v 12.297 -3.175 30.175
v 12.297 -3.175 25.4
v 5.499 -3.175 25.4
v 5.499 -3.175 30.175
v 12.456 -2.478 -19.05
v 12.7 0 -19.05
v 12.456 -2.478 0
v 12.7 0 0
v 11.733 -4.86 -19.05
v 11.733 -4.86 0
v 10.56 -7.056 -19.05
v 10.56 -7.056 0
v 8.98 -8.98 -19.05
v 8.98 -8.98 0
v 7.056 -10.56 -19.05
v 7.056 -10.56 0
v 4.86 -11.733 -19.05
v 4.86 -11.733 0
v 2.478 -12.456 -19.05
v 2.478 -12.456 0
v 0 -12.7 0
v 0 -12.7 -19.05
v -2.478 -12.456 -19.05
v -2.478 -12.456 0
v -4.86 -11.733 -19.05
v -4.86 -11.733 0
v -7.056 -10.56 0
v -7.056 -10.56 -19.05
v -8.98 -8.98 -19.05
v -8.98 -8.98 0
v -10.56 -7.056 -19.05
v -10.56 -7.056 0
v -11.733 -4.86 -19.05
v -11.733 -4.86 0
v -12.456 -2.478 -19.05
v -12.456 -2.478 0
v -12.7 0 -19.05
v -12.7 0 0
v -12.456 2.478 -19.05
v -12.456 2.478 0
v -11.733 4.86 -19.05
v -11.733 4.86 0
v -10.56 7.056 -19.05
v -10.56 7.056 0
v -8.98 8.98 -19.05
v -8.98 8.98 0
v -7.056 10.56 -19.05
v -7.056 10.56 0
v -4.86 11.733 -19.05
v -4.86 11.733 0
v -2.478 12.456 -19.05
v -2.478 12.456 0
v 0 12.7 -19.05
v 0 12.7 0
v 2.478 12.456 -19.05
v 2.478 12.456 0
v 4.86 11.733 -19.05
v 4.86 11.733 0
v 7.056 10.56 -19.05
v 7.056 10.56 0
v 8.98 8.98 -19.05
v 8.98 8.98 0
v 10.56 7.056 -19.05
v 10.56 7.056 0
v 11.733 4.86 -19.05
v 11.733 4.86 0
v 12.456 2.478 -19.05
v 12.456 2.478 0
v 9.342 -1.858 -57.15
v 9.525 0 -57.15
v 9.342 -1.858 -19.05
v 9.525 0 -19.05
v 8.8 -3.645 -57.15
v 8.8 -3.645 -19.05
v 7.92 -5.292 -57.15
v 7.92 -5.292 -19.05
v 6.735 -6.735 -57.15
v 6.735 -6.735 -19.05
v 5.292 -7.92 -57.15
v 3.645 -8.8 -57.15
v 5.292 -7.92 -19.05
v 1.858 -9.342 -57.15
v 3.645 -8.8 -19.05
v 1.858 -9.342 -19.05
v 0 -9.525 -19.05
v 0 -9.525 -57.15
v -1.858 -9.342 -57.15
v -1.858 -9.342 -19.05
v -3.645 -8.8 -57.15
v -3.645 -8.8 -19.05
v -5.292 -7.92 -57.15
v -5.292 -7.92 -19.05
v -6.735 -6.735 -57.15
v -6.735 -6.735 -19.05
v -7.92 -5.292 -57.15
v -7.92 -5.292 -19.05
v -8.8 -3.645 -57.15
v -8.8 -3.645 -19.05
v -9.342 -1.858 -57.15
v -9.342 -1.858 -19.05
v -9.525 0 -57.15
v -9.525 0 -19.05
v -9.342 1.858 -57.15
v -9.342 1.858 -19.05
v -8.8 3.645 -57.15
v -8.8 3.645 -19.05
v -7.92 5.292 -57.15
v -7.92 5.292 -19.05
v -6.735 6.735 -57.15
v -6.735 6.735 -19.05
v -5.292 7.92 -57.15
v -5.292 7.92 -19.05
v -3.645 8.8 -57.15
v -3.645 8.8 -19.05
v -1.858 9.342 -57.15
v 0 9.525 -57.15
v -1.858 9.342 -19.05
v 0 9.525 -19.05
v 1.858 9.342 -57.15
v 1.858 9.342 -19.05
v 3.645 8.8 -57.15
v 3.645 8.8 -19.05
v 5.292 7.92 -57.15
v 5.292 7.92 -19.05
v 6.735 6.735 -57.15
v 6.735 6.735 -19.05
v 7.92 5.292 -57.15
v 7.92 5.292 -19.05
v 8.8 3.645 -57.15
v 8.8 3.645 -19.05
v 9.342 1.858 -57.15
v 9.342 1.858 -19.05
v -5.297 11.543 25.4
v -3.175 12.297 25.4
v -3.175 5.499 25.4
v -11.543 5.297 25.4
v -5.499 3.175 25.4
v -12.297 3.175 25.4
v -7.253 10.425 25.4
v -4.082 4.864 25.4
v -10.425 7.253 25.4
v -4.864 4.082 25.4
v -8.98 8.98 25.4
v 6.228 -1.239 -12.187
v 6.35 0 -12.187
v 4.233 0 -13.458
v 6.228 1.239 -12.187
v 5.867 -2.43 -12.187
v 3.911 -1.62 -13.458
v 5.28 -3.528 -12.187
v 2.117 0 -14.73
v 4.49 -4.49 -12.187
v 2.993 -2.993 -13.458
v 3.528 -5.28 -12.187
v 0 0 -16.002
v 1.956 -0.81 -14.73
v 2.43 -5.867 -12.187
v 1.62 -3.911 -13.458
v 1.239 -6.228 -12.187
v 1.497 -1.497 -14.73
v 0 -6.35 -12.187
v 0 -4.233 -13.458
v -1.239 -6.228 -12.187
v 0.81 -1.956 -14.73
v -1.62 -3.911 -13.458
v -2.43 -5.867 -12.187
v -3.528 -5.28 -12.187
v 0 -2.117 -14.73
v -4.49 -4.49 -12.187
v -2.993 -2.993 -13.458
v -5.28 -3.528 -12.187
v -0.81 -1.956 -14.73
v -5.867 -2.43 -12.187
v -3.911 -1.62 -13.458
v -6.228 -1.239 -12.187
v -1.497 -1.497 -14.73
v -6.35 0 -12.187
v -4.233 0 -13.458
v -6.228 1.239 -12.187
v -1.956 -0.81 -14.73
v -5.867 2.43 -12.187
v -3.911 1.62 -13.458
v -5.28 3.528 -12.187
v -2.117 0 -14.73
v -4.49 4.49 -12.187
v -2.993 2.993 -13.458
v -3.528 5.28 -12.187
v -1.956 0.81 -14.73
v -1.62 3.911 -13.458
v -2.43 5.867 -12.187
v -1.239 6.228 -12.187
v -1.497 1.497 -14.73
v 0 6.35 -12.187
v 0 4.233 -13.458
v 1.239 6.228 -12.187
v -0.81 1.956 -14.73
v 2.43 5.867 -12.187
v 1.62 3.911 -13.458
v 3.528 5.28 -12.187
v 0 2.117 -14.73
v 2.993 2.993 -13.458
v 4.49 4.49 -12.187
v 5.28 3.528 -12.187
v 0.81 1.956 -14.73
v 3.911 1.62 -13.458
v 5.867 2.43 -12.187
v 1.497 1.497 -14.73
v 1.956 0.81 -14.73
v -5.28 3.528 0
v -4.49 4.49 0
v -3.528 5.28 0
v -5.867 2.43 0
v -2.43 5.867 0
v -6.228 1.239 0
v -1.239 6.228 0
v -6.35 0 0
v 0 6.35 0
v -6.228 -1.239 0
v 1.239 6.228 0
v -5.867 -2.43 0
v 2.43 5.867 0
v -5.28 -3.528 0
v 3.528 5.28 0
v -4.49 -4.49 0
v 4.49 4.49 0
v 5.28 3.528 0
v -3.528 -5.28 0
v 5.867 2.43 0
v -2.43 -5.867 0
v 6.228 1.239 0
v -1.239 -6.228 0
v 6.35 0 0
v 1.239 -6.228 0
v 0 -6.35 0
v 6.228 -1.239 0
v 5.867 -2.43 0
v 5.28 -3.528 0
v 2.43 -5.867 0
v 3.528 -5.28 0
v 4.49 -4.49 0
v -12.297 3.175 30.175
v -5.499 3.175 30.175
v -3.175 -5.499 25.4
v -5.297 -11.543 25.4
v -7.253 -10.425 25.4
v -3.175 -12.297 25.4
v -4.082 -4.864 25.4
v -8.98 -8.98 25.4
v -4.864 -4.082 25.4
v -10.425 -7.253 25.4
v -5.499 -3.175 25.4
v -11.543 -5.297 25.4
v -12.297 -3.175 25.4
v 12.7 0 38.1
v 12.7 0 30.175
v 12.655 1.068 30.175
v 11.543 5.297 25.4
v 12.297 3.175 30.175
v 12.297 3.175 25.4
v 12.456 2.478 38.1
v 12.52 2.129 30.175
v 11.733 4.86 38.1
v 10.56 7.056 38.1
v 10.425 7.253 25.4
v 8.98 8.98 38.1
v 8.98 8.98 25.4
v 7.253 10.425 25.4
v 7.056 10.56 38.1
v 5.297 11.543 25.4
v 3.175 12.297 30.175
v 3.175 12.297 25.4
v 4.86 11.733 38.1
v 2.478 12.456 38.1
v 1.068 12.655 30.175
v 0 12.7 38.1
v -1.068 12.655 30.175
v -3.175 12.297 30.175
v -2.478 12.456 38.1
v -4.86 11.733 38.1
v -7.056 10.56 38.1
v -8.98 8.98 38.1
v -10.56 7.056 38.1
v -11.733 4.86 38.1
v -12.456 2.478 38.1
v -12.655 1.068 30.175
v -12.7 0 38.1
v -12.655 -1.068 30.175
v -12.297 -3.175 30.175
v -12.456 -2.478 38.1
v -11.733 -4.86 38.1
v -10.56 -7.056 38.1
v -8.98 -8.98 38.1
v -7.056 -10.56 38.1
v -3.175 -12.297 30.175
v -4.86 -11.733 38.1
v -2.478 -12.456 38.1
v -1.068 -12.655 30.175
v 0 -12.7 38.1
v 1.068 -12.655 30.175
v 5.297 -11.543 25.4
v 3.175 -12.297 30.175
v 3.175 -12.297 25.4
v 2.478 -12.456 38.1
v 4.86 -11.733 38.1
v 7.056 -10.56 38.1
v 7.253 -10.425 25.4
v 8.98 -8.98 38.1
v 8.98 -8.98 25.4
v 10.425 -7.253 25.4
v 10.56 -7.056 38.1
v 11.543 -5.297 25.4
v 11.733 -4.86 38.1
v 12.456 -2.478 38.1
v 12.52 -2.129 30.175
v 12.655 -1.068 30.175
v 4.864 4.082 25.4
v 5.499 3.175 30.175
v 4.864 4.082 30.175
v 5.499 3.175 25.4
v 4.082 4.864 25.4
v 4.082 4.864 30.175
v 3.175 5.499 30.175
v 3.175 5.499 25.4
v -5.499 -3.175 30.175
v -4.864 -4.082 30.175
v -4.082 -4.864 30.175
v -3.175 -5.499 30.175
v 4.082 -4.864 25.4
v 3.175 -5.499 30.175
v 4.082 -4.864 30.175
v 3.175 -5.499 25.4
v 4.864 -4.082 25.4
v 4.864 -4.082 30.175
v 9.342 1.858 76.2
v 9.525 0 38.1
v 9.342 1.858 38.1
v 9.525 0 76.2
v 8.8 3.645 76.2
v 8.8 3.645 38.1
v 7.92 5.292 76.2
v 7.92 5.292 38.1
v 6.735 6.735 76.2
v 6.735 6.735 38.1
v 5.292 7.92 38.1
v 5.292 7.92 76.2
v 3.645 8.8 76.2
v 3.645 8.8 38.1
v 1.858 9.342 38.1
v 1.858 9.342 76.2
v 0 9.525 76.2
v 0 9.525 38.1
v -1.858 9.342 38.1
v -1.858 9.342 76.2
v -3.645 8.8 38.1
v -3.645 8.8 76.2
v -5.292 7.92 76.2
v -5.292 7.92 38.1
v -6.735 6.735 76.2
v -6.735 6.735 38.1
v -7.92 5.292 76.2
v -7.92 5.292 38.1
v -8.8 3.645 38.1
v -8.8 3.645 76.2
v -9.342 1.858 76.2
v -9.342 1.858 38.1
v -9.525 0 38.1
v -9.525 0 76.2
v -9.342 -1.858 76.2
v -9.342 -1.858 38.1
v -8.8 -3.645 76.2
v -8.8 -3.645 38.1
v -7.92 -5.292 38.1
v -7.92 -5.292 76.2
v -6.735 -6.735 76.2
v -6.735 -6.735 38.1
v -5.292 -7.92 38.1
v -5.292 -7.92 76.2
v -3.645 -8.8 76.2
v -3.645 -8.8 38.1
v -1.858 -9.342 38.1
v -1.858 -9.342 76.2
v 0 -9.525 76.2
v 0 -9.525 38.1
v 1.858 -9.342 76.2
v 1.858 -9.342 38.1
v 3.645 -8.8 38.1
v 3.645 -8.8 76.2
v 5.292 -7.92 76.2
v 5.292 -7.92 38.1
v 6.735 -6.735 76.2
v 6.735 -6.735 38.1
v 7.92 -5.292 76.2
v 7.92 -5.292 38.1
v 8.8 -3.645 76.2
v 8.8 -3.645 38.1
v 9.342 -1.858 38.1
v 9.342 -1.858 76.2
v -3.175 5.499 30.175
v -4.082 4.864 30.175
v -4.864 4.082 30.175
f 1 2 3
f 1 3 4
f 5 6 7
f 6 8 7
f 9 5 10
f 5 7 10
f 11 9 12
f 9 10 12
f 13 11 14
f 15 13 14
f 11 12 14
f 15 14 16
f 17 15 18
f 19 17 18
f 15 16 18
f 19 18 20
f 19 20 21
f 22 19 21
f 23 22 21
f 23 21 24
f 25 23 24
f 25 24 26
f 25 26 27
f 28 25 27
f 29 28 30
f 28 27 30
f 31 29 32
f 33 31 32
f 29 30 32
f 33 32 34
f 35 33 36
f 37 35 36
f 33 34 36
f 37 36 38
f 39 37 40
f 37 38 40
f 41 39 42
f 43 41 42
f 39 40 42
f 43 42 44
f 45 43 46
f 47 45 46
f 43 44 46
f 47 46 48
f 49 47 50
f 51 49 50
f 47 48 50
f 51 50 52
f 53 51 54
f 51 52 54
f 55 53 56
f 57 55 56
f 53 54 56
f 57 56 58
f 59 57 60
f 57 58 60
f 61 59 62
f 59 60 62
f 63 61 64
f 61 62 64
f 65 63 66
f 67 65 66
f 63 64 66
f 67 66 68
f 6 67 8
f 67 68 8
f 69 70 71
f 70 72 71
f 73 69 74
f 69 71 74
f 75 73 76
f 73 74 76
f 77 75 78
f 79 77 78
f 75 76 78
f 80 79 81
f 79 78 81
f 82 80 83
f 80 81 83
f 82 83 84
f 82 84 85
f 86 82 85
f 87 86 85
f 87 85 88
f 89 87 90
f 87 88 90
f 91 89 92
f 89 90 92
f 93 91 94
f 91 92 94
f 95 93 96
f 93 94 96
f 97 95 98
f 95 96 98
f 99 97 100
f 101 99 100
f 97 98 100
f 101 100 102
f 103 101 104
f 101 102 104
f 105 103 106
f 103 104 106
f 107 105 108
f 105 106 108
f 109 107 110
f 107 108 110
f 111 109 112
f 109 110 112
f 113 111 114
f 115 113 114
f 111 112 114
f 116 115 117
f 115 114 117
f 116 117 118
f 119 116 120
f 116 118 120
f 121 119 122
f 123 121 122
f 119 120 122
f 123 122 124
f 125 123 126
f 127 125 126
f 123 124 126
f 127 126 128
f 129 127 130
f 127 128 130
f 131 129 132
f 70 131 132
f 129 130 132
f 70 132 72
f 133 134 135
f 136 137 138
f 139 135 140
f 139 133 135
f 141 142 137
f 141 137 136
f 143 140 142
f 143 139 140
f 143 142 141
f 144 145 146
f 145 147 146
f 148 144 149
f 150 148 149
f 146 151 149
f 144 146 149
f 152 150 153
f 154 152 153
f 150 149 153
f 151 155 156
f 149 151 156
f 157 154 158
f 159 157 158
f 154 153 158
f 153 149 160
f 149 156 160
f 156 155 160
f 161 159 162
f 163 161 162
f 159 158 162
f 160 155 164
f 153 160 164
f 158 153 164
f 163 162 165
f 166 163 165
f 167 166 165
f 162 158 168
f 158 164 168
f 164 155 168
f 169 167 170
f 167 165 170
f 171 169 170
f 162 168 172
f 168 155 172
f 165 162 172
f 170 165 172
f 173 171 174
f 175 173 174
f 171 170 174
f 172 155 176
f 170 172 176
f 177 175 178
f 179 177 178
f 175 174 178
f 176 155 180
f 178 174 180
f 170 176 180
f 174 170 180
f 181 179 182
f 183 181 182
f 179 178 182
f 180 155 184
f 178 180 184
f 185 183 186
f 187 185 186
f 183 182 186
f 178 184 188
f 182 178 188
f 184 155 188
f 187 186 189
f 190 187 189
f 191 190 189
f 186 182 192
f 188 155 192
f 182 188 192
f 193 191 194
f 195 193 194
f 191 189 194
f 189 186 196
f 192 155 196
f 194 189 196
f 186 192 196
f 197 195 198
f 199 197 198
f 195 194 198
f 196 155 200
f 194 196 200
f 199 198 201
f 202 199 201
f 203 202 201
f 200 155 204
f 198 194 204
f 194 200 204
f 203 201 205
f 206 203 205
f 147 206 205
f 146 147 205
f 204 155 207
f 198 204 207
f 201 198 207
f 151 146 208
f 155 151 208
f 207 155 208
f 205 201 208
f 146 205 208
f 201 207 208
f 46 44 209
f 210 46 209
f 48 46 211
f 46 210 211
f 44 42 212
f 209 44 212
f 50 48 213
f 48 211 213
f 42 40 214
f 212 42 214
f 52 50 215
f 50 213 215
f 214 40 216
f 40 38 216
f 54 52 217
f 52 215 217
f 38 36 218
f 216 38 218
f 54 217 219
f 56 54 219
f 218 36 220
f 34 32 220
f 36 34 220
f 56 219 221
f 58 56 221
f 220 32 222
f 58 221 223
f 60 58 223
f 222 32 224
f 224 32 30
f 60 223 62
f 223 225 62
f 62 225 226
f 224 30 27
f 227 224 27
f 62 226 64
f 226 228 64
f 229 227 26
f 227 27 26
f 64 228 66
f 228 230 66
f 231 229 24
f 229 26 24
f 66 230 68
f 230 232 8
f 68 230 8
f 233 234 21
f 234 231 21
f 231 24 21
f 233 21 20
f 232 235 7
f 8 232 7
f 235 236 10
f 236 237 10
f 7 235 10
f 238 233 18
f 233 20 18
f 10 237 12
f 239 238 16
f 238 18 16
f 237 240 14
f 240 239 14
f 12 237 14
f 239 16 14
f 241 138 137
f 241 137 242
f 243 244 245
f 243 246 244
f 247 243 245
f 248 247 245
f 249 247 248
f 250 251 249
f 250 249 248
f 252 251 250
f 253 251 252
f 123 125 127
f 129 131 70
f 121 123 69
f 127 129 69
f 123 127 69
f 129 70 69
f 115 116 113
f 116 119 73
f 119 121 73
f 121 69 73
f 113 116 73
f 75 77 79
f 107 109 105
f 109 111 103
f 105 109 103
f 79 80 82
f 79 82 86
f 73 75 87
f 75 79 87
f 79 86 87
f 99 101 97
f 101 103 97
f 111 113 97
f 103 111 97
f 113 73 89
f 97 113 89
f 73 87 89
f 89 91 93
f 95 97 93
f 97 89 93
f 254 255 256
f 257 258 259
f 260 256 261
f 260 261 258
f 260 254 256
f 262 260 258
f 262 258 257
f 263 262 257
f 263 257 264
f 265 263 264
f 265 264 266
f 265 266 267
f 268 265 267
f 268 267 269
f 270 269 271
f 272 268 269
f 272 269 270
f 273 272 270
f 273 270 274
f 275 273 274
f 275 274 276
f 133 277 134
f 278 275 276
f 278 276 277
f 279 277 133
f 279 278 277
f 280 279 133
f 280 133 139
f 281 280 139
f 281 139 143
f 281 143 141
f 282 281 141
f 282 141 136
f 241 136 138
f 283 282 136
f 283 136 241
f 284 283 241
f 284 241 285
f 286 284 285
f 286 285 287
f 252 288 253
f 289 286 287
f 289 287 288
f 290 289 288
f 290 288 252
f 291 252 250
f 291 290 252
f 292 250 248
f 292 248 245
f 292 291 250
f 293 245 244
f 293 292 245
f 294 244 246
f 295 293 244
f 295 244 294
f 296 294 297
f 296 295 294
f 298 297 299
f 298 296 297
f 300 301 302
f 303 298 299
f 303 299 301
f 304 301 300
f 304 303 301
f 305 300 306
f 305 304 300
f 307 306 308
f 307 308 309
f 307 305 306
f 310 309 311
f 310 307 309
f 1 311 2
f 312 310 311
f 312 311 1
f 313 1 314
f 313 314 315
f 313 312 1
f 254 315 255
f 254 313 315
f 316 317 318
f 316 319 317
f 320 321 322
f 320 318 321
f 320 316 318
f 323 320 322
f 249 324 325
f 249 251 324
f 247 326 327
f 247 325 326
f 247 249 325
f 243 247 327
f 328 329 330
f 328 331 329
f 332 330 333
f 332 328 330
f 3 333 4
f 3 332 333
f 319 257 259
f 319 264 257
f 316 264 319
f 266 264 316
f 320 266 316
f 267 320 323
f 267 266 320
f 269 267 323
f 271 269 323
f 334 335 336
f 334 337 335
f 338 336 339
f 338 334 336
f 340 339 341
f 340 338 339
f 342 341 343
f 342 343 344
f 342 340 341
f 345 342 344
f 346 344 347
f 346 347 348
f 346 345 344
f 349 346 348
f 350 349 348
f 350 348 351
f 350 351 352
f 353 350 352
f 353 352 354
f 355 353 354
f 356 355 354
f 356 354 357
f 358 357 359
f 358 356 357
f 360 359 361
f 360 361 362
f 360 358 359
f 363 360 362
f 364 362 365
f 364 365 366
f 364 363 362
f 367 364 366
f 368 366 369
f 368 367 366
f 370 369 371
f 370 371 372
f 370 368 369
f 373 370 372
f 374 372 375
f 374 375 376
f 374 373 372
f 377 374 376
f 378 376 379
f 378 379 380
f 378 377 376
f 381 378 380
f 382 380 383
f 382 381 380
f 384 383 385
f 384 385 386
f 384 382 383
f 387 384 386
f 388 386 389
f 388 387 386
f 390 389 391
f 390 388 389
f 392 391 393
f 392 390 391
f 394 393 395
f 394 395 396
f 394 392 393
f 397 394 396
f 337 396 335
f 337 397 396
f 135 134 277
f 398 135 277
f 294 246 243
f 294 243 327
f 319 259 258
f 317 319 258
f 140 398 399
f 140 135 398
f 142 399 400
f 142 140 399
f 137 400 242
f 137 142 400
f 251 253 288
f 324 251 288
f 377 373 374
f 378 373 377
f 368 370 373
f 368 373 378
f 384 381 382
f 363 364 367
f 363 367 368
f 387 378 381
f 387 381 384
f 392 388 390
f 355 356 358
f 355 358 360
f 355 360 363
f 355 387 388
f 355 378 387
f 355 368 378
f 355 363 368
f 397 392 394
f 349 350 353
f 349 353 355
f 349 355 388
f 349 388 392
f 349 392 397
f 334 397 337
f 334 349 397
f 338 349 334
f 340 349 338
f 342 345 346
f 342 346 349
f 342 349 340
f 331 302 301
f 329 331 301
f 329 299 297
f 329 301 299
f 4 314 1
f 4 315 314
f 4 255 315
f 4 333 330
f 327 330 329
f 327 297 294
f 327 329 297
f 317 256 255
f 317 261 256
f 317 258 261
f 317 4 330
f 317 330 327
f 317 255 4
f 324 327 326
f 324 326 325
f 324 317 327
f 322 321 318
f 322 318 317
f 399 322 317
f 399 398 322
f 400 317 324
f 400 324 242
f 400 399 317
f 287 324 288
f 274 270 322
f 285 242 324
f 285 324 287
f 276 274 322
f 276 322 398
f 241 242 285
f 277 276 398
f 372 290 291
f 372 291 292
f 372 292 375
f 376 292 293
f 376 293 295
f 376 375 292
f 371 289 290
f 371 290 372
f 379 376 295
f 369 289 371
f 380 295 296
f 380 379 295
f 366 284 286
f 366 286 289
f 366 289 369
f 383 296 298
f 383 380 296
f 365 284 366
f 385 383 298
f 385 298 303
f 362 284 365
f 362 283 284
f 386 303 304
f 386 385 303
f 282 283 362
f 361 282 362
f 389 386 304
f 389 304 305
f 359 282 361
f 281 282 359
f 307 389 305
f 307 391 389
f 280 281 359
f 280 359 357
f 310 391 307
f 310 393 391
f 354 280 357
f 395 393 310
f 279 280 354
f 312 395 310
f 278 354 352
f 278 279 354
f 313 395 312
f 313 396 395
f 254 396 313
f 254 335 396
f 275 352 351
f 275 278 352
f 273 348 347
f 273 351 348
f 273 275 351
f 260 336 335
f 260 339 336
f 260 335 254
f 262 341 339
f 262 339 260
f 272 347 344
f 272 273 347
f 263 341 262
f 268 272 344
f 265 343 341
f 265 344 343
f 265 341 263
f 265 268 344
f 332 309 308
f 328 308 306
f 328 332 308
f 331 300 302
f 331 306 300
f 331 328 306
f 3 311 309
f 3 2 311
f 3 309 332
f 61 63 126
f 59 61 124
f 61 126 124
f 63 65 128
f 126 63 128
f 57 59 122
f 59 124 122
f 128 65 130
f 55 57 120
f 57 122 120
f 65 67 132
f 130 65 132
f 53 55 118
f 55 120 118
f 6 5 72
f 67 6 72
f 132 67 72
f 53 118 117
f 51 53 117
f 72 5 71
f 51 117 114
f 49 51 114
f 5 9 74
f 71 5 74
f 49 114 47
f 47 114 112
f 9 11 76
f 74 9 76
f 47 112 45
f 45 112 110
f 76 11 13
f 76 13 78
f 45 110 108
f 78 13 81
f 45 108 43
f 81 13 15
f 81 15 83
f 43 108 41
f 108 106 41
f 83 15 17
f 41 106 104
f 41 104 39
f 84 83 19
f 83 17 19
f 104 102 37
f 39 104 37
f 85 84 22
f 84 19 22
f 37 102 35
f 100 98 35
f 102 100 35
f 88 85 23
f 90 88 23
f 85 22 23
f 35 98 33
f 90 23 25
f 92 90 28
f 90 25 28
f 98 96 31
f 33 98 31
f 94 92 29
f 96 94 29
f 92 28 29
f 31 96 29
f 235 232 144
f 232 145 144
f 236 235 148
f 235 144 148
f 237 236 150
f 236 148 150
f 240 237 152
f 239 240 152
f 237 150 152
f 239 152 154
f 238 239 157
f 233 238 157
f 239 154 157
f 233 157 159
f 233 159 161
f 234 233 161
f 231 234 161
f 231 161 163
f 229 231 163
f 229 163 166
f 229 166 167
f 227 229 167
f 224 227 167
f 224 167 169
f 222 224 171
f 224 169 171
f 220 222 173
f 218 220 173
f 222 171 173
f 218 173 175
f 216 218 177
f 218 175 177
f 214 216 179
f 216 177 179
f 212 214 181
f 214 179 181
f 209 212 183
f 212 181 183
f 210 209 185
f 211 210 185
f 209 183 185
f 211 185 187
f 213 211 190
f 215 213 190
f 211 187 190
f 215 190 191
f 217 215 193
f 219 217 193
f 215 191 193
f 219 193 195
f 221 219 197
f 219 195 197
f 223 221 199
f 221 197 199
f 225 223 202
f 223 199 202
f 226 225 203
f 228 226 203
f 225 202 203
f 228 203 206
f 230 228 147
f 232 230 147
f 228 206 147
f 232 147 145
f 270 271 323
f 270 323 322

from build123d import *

# Parameters (mm, degrees)
F4_W          = 6.35
F4_H          = 4.7752
F5_DEPTH      = 12.701
F5_DEPTH_BACK = 12.701
F6_W          = 6.35
F6_H          = 4.7752
F7_DEPTH      = 12.701
F7_DEPTH_BACK = 12.701


with BuildPart() as f1:
    # F0 (on Front) → F1 (revolve)
    with BuildSketch(Plane.XZ):
        Polygon((12.7, 0), (6.35, 0), (6.35, -12.1865350692), (0, -16.002), (0, -57.15), (9.525, -57.15), (9.525, -19.05), (12.7, -19.05), align=None)
    revolve(axis=Axis((0, 0, 23.685501908), (0, 0, -1)))


with BuildPart() as f3:
    # F2 (on Front) → F3 (revolve)
    with BuildSketch(Plane.XZ):
        Polygon((0, 76.2), (0, 30.1752), (6.35, 30.1752), (6.35, 25.4), (12.7, 25.4), (12.7, 38.1), (9.525, 38.1), (9.525, 76.2), align=None)
    revolve(axis=Axis((0, 0, 23.4449315517), (0, 0, 1)))

    # F4 (on Right) → F5 (cut, two sides)
    with BuildSketch(Plane.YZ) as f5_sk:
        with Locations((0, 27.7876)):
            Rectangle(F4_W, F4_H)
    extrude(amount=-F5_DEPTH, mode=Mode.SUBTRACT)
    extrude(f5_sk.sketch, amount=F5_DEPTH_BACK, mode=Mode.SUBTRACT)

    # F6 (on Front) → F7 (cut, two sides)
    with BuildSketch(Plane.XZ) as f7_sk:
        with Locations((0, 27.7876)):
            Rectangle(F6_W, F6_H)
    extrude(amount=F7_DEPTH, mode=Mode.SUBTRACT)
    extrude(f7_sk.sketch, amount=-F7_DEPTH_BACK, mode=Mode.SUBTRACT)


solid = Compound([f1.part, f3.part])
